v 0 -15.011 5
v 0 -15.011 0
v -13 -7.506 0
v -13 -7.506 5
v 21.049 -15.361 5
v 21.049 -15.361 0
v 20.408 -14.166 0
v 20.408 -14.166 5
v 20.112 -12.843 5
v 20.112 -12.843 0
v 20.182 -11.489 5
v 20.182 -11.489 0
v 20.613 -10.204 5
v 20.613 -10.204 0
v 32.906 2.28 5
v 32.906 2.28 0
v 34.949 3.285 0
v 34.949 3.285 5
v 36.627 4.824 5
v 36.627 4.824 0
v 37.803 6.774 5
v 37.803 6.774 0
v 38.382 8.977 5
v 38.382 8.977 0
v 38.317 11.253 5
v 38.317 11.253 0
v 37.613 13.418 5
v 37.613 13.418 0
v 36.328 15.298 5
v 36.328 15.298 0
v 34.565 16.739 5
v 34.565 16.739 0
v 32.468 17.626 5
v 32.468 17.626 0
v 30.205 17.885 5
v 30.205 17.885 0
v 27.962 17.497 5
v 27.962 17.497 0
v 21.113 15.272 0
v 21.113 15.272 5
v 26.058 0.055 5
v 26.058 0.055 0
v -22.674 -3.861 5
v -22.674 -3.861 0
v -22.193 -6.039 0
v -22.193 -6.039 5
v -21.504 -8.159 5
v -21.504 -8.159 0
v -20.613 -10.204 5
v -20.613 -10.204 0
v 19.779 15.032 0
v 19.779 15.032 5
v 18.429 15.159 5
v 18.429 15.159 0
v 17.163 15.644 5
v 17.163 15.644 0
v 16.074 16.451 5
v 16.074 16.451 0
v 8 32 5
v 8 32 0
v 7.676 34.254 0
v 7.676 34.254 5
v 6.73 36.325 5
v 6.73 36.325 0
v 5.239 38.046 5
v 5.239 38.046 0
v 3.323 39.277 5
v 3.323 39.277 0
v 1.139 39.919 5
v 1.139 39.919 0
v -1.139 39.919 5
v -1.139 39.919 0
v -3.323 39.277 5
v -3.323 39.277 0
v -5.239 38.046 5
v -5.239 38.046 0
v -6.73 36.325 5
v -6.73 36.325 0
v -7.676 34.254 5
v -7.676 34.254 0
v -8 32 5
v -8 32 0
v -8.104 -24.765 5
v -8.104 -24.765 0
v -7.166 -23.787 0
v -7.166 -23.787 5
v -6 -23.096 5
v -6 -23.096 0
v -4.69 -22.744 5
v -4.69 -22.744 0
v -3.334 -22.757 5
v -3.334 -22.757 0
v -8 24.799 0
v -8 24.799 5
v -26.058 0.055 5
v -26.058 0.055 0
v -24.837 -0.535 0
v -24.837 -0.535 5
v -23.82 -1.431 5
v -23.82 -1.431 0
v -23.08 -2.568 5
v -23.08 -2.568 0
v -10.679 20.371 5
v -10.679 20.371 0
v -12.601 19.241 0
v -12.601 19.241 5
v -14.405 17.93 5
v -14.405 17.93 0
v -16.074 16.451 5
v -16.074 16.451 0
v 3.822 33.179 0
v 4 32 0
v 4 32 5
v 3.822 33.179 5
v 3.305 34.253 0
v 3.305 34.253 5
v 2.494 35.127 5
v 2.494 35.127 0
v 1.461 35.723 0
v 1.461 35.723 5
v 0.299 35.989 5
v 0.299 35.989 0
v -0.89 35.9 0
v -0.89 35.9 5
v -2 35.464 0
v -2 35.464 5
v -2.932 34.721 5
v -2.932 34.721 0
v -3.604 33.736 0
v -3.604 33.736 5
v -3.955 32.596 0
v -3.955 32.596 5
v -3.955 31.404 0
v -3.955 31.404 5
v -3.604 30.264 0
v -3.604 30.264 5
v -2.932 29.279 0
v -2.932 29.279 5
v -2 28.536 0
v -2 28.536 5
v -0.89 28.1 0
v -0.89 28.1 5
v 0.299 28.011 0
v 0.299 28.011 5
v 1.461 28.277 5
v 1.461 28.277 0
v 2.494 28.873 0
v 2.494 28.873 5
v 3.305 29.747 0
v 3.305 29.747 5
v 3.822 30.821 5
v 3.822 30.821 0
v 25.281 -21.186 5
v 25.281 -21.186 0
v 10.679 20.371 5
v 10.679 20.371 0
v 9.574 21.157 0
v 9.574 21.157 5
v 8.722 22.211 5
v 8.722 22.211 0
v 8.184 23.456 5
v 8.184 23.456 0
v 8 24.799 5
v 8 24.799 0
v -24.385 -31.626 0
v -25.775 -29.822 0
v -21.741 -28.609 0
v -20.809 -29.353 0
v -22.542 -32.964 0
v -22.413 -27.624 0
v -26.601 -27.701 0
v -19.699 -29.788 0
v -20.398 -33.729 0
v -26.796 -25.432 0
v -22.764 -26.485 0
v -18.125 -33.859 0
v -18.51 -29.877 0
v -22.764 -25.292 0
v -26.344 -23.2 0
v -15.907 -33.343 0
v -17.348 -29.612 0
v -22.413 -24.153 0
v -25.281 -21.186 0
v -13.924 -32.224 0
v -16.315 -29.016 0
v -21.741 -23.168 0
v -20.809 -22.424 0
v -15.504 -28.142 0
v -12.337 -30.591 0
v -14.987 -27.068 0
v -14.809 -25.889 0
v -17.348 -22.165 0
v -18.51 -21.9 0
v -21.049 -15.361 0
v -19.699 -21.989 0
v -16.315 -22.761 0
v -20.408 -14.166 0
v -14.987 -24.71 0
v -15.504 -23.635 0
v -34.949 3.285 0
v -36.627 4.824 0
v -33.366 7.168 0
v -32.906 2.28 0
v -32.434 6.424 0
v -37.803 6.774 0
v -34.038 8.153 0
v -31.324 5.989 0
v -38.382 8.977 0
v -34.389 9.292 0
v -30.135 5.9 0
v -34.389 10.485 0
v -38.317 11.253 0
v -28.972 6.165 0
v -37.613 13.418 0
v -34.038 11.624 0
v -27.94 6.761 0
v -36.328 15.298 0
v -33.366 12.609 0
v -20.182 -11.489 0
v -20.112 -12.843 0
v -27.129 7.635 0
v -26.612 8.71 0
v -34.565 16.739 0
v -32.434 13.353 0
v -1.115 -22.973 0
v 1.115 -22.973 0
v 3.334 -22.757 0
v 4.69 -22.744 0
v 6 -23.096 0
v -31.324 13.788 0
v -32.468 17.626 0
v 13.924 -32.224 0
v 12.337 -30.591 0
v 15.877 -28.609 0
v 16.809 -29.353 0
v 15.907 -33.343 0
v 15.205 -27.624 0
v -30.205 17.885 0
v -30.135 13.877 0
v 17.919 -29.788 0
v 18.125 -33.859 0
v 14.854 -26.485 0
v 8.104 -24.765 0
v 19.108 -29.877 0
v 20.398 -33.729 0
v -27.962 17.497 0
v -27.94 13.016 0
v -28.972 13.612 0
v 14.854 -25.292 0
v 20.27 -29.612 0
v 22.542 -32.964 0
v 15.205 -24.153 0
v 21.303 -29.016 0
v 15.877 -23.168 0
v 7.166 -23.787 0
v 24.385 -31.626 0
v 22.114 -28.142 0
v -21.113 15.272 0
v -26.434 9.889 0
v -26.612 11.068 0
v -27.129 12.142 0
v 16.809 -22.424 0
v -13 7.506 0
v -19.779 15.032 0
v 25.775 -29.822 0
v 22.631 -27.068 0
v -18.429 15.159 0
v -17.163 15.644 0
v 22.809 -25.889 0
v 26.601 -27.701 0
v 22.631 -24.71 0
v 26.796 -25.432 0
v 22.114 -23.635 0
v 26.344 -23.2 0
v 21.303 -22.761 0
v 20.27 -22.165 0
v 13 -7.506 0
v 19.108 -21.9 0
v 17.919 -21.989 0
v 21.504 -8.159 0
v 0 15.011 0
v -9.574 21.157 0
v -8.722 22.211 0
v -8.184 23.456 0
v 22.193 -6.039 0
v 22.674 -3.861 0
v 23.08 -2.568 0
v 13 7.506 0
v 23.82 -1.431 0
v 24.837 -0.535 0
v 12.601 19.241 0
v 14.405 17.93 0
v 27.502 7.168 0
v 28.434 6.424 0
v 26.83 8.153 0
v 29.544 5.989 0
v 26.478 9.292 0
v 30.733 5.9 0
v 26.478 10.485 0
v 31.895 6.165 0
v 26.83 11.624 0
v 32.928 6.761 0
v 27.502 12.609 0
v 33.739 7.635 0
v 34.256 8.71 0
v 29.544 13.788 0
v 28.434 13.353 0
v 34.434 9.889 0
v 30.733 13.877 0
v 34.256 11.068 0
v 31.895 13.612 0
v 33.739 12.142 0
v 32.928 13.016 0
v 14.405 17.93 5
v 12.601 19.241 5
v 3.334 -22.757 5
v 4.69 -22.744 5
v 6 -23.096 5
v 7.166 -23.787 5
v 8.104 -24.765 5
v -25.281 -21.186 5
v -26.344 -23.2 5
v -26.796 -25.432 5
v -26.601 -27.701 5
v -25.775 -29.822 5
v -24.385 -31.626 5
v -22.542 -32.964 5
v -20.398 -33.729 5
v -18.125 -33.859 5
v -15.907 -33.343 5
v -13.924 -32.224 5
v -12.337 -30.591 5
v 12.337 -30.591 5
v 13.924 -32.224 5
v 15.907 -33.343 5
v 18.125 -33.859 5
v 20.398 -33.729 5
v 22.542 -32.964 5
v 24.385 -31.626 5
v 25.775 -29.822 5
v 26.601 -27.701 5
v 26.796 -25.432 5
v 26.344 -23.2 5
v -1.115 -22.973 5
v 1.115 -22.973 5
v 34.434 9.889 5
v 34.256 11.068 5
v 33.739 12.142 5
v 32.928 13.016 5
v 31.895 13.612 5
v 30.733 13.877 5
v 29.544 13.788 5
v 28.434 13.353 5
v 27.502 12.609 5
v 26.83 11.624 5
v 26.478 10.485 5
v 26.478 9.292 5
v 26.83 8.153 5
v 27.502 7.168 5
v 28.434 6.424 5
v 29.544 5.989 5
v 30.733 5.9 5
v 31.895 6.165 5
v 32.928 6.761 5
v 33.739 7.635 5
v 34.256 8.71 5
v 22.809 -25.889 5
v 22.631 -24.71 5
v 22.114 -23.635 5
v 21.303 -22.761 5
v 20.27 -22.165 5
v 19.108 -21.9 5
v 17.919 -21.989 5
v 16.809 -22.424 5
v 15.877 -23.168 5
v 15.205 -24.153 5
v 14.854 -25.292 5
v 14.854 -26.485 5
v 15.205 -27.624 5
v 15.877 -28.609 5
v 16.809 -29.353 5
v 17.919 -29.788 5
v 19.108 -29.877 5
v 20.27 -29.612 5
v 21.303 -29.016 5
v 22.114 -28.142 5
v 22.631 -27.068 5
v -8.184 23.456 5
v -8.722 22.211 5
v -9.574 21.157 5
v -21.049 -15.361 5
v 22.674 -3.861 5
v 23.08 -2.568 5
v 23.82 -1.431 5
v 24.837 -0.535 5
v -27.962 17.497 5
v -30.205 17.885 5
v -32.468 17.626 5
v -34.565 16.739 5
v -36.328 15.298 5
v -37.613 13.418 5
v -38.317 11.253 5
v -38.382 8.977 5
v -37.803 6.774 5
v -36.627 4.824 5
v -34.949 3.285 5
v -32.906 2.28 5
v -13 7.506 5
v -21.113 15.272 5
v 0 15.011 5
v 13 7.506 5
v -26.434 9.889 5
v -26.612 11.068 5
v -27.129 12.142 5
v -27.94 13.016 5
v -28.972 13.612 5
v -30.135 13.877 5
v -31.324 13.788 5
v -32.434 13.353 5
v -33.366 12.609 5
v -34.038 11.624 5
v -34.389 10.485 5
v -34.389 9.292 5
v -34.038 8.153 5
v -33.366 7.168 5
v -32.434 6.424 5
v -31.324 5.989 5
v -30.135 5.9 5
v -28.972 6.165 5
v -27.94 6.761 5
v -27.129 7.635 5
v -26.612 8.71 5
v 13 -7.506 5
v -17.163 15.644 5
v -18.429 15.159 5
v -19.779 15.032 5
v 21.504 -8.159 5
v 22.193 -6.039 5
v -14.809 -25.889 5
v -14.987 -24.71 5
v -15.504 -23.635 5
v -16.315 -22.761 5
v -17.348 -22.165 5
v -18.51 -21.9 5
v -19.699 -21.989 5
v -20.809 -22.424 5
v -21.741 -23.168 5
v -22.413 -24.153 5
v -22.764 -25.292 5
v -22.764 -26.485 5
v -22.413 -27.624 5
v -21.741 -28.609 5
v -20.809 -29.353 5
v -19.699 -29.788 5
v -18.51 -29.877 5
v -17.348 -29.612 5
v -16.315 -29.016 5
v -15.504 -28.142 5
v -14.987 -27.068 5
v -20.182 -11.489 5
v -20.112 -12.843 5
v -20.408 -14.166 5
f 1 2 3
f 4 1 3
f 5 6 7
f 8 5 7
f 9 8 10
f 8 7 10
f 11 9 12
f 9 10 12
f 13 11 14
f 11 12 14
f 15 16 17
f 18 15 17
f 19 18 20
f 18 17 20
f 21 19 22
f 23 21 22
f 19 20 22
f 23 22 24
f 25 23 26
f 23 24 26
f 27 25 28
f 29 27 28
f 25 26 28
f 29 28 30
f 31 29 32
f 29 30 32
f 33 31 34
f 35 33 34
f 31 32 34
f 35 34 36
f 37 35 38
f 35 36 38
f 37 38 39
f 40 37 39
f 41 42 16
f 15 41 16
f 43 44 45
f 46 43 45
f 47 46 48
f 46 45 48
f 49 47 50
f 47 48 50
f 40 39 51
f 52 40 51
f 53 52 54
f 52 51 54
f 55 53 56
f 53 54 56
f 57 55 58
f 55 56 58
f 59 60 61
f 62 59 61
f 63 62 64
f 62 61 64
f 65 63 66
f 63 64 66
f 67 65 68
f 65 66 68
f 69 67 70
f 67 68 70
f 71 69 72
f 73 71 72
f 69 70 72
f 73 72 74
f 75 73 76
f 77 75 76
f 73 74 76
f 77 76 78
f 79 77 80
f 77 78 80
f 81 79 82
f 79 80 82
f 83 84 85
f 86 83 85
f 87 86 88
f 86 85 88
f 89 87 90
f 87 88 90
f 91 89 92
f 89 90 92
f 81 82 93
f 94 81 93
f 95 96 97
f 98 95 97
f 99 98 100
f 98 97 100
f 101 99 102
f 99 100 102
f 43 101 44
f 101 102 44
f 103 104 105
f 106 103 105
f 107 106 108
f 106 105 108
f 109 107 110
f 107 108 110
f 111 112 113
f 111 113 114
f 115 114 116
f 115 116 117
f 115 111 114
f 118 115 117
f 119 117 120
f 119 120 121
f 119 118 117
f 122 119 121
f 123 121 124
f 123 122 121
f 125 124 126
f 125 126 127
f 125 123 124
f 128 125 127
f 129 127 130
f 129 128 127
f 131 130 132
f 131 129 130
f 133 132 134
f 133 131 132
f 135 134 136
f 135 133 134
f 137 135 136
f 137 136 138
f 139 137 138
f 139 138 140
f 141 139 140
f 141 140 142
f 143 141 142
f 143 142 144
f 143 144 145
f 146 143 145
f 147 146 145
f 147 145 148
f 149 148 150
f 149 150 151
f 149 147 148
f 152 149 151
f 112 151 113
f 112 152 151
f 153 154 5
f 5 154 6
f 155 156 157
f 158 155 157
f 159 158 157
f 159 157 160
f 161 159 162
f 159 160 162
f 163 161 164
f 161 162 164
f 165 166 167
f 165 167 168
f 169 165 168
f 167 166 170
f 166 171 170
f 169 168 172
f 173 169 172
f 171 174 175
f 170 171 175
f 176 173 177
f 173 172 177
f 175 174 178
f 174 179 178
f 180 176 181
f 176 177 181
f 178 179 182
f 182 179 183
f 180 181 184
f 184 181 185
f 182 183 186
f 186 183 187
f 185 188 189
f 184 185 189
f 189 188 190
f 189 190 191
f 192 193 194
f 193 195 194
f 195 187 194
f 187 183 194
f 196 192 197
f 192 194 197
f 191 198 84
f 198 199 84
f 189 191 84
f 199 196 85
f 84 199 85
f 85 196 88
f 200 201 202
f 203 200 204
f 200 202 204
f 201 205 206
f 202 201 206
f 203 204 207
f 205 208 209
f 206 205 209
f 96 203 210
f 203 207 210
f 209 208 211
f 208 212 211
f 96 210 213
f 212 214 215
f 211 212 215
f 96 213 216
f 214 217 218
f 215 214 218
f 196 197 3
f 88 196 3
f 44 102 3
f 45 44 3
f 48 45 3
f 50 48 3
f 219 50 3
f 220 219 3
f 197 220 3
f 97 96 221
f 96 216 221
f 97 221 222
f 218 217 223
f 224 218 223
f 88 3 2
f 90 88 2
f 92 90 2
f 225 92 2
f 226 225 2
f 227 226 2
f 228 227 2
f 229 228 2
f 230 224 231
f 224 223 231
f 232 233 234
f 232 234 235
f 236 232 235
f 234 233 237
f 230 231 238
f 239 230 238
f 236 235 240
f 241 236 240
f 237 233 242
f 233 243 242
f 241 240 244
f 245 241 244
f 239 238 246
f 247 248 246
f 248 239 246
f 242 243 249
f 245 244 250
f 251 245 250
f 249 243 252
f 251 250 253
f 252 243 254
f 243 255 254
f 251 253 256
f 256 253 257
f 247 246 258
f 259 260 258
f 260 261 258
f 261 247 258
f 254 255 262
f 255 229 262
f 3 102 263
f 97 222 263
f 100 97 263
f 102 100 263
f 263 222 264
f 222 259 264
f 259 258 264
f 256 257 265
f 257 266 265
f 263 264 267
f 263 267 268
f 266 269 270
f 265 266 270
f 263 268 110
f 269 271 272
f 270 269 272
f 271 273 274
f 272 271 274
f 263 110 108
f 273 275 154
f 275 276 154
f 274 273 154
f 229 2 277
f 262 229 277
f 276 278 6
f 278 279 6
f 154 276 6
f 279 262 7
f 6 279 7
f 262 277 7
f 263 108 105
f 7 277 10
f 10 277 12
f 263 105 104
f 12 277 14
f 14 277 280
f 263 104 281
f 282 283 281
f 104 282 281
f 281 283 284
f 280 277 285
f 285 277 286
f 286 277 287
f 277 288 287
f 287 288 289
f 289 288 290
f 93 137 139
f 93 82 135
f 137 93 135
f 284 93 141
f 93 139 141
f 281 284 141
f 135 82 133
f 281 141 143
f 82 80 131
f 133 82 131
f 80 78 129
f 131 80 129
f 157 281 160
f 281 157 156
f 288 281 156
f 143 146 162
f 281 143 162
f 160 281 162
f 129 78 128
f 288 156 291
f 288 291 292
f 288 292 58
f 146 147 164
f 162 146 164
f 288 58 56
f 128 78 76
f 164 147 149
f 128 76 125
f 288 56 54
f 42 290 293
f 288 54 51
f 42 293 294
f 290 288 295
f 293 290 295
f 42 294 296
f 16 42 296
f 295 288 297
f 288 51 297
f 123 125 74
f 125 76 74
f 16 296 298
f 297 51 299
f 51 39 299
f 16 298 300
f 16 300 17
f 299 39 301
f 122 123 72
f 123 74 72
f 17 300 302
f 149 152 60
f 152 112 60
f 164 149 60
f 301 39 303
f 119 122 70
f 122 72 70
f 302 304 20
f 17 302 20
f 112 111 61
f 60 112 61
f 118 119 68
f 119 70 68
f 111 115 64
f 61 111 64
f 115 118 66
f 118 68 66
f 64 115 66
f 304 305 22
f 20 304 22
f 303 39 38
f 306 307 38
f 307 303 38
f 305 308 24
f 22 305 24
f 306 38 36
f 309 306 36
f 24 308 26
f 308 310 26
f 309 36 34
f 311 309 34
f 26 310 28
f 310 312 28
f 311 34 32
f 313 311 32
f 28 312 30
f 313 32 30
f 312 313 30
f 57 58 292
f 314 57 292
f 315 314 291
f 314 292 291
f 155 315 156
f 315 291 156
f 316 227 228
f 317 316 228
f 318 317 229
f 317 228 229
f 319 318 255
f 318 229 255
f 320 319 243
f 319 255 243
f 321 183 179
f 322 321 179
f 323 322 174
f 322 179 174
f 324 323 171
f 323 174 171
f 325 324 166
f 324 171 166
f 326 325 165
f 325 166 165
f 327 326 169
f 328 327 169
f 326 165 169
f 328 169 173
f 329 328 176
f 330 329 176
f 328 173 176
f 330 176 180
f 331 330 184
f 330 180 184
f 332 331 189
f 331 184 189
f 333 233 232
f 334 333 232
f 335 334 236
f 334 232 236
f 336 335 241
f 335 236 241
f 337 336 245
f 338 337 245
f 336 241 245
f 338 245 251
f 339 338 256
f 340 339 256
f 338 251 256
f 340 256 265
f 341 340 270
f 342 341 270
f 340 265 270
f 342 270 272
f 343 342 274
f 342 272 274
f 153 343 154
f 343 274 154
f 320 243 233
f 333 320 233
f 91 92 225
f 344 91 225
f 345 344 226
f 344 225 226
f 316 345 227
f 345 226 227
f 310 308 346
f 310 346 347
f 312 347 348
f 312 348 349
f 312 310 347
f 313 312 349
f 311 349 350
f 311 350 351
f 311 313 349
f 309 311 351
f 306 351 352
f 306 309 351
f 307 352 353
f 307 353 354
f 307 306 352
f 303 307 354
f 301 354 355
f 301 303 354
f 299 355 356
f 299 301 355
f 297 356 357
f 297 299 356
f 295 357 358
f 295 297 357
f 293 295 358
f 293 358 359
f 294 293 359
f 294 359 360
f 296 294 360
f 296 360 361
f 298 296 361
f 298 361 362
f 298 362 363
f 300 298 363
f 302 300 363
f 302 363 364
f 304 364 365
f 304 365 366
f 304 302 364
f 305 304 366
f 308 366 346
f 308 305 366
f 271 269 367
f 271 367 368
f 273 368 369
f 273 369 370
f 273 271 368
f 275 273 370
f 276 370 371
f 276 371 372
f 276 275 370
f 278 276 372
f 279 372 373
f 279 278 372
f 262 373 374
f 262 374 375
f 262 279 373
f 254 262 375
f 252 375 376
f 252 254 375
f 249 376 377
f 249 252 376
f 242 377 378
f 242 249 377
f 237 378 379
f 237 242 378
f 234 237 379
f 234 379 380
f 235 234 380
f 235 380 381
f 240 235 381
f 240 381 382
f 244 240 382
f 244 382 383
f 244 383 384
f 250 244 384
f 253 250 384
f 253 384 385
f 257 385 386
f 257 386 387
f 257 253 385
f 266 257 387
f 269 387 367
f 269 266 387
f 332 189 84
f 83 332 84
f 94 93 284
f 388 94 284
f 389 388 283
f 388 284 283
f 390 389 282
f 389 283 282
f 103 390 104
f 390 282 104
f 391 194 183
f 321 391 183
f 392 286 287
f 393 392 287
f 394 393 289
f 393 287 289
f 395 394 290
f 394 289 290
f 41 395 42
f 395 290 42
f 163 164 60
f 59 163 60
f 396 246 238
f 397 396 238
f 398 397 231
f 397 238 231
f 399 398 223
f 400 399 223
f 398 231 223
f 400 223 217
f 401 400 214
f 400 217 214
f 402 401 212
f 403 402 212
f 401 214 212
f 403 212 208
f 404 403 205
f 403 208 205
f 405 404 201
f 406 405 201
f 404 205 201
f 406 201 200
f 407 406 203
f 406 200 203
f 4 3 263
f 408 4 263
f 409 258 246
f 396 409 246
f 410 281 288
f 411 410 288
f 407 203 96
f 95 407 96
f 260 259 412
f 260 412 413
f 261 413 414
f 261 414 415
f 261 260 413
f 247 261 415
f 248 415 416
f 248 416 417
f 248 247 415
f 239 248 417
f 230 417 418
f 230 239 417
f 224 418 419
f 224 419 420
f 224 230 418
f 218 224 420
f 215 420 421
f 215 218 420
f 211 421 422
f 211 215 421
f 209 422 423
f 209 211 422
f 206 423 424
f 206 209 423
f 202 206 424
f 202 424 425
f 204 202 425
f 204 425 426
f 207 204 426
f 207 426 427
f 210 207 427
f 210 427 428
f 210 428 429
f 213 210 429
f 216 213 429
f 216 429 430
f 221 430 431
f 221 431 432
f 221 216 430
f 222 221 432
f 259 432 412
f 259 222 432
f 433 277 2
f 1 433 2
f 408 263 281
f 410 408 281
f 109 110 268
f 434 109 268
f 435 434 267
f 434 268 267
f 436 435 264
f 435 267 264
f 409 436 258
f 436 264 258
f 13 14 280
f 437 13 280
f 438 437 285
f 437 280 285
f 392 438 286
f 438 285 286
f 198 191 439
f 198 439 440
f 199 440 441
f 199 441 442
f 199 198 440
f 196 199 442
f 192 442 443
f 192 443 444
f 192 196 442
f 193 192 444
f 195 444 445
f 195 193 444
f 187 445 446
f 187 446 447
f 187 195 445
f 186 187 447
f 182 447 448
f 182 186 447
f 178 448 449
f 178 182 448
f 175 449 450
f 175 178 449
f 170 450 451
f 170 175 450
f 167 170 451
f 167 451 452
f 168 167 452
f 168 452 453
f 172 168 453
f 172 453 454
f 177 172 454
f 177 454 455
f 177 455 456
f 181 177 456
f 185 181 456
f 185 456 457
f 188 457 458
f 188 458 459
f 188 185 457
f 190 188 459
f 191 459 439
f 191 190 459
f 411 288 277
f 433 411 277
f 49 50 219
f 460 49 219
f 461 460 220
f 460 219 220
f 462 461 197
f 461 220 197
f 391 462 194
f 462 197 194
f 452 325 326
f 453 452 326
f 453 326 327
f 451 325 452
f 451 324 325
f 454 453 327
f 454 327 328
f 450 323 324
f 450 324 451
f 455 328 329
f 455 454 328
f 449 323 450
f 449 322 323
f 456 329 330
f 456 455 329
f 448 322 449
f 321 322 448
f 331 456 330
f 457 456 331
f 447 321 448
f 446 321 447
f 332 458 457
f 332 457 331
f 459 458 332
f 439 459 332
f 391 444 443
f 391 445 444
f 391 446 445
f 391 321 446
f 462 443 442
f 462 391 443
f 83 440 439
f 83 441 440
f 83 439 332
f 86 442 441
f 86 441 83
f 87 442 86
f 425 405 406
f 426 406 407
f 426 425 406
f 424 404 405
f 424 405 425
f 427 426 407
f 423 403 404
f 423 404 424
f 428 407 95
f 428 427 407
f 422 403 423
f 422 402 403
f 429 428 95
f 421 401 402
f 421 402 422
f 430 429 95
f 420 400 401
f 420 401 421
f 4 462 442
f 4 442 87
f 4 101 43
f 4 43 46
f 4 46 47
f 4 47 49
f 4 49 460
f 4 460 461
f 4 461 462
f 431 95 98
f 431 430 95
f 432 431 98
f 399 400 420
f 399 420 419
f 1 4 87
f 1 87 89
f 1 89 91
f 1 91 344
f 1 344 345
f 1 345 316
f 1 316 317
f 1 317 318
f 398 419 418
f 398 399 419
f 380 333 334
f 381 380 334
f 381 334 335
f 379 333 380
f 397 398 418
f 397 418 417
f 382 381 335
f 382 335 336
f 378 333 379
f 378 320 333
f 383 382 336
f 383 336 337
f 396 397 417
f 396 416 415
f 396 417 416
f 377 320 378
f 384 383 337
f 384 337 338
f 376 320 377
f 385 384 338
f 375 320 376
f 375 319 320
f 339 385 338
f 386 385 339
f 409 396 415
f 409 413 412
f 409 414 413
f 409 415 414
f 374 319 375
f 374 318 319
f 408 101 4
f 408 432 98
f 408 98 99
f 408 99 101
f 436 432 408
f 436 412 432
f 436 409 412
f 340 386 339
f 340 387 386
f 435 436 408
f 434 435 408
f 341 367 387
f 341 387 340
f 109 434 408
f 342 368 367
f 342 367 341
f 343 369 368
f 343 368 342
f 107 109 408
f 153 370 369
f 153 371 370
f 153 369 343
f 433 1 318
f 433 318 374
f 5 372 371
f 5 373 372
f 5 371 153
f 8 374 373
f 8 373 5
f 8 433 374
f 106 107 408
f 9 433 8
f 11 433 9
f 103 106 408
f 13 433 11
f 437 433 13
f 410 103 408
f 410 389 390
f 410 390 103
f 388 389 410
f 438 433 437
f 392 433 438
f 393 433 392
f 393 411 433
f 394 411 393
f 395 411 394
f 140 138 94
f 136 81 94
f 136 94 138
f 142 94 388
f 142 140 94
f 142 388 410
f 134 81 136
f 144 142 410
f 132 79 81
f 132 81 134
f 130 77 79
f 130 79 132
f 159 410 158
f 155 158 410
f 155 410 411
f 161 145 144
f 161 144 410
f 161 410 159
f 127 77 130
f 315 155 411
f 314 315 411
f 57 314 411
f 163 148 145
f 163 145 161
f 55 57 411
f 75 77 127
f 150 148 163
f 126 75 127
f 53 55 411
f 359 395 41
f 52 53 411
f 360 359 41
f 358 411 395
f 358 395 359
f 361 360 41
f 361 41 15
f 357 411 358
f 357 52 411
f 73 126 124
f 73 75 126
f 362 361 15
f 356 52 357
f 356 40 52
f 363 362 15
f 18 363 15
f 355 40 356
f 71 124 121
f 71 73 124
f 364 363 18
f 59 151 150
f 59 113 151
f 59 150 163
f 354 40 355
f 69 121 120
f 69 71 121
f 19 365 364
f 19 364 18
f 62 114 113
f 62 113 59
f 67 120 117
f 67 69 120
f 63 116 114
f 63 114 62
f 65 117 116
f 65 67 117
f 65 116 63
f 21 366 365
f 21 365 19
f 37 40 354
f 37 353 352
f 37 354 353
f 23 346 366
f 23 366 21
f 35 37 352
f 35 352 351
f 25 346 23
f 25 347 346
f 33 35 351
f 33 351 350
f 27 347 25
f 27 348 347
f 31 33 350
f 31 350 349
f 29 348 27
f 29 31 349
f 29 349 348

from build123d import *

# Parameters (mm, degrees)
F0_R     = 4
F1_DEPTH = 5


with BuildPart() as f1:
    # F0 (on Top) → F1 (new body)
    with BuildSketch(Plane.XY):
        with BuildLine():
            Line((8, 24.799194), (8, 32))
            ThreePointArc((8, 32), (0, 40), (-8, 32))
            Line((-8, 32), (-8, 24.799194))
            ThreePointArc((-8, 24.799194), (-8.721733, 22.211448), (-10.678571, 20.370766))
            ThreePointArc((-10.678571, 20.370766), (-13.519061, 18.607391), (-16.07389, 16.450838))
            ThreePointArc((-16.07389, 16.450838), (-18.429178, 15.158575), (-21.113299, 15.271824))
            Line((-21.113299, 15.271824), (-27.961673, 17.496996))
            ThreePointArc((-27.961673, 17.496996), (-38.042261, 12.36068), (-32.905944, 2.280092))
            Line((-32.905944, 2.280092), (-26.057571, 0.05492))
            ThreePointArc((-26.057571, 0.05492), (-23.819506, -1.431146), (-22.67361, -3.861012))
            ThreePointArc((-22.67361, -3.861012), (-21.8743, -7.107391), (-20.612782, -10.203589))
            ThreePointArc((-20.612782, -10.203589), (-20.111591, -12.842933), (-21.048736, -15.360687))
            Line((-21.048736, -15.360687), (-25.281264, -21.186262))
            ThreePointArc((-25.281264, -21.186262), (-23.51141, -32.36068), (-12.336992, -30.590826))
            Line((-12.336992, -30.590826), (-8.104464, -24.765251))
            ThreePointArc((-8.104464, -24.765251), (-5.999531, -23.095944), (-3.33449, -22.757003))
            ThreePointArc((-3.33449, -22.757003), (0, -23), (3.33449, -22.757003))
            ThreePointArc((3.33449, -22.757003), (5.999531, -23.095944), (8.104464, -24.765251))
            Line((8.104464, -24.765251), (12.336992, -30.590826))
            ThreePointArc((12.336992, -30.590826), (23.51141, -32.36068), (25.281264, -21.186262))
            Line((25.281264, -21.186262), (21.048736, -15.360687))
            ThreePointArc((21.048736, -15.360687), (20.111591, -12.842933), (20.612782, -10.203589))
            ThreePointArc((20.612782, -10.203589), (21.8743, -7.107391), (22.67361, -3.861012))
            ThreePointArc((22.67361, -3.861012), (23.819506, -1.431146), (26.057571, 0.05492))
            Line((26.057571, 0.05492), (32.905944, 2.280092))
            ThreePointArc((32.905944, 2.280092), (38.042261, 12.36068), (27.961673, 17.496996))
            Line((27.961673, 17.496996), (21.113299, 15.271824))
            ThreePointArc((21.113299, 15.271824), (18.429178, 15.158575), (16.07389, 16.450838))
            ThreePointArc((16.07389, 16.450838), (13.519061, 18.607391), (10.678571, 20.370766))
            ThreePointArc((10.678571, 20.370766), (8.721733, 22.211448), (8, 24.799194))
        make_face()
        with Locations((-18.809128, -25.888544)):
            Circle(F0_R, mode=Mode.SUBTRACT)
        with Locations((18.809128, -25.888544)):
            Circle(F0_R, mode=Mode.SUBTRACT)
        Polygon((0, -15.011107), (-13, -7.505553), (-13, 7.505553), (0, 15.011107), (13, 7.505553), (13, -7.505553), align=None, mode=Mode.SUBTRACT)
        with Locations((-30.433809, 9.888544)):
            Circle(F0_R, mode=Mode.SUBTRACT)
        with Locations((30.433809, 9.888544)):
            Circle(F0_R, mode=Mode.SUBTRACT)
        with Locations((0, 32)):
            Circle(F0_R, mode=Mode.SUBTRACT)
    extrude(amount=F1_DEPTH)


solid = f1.part
